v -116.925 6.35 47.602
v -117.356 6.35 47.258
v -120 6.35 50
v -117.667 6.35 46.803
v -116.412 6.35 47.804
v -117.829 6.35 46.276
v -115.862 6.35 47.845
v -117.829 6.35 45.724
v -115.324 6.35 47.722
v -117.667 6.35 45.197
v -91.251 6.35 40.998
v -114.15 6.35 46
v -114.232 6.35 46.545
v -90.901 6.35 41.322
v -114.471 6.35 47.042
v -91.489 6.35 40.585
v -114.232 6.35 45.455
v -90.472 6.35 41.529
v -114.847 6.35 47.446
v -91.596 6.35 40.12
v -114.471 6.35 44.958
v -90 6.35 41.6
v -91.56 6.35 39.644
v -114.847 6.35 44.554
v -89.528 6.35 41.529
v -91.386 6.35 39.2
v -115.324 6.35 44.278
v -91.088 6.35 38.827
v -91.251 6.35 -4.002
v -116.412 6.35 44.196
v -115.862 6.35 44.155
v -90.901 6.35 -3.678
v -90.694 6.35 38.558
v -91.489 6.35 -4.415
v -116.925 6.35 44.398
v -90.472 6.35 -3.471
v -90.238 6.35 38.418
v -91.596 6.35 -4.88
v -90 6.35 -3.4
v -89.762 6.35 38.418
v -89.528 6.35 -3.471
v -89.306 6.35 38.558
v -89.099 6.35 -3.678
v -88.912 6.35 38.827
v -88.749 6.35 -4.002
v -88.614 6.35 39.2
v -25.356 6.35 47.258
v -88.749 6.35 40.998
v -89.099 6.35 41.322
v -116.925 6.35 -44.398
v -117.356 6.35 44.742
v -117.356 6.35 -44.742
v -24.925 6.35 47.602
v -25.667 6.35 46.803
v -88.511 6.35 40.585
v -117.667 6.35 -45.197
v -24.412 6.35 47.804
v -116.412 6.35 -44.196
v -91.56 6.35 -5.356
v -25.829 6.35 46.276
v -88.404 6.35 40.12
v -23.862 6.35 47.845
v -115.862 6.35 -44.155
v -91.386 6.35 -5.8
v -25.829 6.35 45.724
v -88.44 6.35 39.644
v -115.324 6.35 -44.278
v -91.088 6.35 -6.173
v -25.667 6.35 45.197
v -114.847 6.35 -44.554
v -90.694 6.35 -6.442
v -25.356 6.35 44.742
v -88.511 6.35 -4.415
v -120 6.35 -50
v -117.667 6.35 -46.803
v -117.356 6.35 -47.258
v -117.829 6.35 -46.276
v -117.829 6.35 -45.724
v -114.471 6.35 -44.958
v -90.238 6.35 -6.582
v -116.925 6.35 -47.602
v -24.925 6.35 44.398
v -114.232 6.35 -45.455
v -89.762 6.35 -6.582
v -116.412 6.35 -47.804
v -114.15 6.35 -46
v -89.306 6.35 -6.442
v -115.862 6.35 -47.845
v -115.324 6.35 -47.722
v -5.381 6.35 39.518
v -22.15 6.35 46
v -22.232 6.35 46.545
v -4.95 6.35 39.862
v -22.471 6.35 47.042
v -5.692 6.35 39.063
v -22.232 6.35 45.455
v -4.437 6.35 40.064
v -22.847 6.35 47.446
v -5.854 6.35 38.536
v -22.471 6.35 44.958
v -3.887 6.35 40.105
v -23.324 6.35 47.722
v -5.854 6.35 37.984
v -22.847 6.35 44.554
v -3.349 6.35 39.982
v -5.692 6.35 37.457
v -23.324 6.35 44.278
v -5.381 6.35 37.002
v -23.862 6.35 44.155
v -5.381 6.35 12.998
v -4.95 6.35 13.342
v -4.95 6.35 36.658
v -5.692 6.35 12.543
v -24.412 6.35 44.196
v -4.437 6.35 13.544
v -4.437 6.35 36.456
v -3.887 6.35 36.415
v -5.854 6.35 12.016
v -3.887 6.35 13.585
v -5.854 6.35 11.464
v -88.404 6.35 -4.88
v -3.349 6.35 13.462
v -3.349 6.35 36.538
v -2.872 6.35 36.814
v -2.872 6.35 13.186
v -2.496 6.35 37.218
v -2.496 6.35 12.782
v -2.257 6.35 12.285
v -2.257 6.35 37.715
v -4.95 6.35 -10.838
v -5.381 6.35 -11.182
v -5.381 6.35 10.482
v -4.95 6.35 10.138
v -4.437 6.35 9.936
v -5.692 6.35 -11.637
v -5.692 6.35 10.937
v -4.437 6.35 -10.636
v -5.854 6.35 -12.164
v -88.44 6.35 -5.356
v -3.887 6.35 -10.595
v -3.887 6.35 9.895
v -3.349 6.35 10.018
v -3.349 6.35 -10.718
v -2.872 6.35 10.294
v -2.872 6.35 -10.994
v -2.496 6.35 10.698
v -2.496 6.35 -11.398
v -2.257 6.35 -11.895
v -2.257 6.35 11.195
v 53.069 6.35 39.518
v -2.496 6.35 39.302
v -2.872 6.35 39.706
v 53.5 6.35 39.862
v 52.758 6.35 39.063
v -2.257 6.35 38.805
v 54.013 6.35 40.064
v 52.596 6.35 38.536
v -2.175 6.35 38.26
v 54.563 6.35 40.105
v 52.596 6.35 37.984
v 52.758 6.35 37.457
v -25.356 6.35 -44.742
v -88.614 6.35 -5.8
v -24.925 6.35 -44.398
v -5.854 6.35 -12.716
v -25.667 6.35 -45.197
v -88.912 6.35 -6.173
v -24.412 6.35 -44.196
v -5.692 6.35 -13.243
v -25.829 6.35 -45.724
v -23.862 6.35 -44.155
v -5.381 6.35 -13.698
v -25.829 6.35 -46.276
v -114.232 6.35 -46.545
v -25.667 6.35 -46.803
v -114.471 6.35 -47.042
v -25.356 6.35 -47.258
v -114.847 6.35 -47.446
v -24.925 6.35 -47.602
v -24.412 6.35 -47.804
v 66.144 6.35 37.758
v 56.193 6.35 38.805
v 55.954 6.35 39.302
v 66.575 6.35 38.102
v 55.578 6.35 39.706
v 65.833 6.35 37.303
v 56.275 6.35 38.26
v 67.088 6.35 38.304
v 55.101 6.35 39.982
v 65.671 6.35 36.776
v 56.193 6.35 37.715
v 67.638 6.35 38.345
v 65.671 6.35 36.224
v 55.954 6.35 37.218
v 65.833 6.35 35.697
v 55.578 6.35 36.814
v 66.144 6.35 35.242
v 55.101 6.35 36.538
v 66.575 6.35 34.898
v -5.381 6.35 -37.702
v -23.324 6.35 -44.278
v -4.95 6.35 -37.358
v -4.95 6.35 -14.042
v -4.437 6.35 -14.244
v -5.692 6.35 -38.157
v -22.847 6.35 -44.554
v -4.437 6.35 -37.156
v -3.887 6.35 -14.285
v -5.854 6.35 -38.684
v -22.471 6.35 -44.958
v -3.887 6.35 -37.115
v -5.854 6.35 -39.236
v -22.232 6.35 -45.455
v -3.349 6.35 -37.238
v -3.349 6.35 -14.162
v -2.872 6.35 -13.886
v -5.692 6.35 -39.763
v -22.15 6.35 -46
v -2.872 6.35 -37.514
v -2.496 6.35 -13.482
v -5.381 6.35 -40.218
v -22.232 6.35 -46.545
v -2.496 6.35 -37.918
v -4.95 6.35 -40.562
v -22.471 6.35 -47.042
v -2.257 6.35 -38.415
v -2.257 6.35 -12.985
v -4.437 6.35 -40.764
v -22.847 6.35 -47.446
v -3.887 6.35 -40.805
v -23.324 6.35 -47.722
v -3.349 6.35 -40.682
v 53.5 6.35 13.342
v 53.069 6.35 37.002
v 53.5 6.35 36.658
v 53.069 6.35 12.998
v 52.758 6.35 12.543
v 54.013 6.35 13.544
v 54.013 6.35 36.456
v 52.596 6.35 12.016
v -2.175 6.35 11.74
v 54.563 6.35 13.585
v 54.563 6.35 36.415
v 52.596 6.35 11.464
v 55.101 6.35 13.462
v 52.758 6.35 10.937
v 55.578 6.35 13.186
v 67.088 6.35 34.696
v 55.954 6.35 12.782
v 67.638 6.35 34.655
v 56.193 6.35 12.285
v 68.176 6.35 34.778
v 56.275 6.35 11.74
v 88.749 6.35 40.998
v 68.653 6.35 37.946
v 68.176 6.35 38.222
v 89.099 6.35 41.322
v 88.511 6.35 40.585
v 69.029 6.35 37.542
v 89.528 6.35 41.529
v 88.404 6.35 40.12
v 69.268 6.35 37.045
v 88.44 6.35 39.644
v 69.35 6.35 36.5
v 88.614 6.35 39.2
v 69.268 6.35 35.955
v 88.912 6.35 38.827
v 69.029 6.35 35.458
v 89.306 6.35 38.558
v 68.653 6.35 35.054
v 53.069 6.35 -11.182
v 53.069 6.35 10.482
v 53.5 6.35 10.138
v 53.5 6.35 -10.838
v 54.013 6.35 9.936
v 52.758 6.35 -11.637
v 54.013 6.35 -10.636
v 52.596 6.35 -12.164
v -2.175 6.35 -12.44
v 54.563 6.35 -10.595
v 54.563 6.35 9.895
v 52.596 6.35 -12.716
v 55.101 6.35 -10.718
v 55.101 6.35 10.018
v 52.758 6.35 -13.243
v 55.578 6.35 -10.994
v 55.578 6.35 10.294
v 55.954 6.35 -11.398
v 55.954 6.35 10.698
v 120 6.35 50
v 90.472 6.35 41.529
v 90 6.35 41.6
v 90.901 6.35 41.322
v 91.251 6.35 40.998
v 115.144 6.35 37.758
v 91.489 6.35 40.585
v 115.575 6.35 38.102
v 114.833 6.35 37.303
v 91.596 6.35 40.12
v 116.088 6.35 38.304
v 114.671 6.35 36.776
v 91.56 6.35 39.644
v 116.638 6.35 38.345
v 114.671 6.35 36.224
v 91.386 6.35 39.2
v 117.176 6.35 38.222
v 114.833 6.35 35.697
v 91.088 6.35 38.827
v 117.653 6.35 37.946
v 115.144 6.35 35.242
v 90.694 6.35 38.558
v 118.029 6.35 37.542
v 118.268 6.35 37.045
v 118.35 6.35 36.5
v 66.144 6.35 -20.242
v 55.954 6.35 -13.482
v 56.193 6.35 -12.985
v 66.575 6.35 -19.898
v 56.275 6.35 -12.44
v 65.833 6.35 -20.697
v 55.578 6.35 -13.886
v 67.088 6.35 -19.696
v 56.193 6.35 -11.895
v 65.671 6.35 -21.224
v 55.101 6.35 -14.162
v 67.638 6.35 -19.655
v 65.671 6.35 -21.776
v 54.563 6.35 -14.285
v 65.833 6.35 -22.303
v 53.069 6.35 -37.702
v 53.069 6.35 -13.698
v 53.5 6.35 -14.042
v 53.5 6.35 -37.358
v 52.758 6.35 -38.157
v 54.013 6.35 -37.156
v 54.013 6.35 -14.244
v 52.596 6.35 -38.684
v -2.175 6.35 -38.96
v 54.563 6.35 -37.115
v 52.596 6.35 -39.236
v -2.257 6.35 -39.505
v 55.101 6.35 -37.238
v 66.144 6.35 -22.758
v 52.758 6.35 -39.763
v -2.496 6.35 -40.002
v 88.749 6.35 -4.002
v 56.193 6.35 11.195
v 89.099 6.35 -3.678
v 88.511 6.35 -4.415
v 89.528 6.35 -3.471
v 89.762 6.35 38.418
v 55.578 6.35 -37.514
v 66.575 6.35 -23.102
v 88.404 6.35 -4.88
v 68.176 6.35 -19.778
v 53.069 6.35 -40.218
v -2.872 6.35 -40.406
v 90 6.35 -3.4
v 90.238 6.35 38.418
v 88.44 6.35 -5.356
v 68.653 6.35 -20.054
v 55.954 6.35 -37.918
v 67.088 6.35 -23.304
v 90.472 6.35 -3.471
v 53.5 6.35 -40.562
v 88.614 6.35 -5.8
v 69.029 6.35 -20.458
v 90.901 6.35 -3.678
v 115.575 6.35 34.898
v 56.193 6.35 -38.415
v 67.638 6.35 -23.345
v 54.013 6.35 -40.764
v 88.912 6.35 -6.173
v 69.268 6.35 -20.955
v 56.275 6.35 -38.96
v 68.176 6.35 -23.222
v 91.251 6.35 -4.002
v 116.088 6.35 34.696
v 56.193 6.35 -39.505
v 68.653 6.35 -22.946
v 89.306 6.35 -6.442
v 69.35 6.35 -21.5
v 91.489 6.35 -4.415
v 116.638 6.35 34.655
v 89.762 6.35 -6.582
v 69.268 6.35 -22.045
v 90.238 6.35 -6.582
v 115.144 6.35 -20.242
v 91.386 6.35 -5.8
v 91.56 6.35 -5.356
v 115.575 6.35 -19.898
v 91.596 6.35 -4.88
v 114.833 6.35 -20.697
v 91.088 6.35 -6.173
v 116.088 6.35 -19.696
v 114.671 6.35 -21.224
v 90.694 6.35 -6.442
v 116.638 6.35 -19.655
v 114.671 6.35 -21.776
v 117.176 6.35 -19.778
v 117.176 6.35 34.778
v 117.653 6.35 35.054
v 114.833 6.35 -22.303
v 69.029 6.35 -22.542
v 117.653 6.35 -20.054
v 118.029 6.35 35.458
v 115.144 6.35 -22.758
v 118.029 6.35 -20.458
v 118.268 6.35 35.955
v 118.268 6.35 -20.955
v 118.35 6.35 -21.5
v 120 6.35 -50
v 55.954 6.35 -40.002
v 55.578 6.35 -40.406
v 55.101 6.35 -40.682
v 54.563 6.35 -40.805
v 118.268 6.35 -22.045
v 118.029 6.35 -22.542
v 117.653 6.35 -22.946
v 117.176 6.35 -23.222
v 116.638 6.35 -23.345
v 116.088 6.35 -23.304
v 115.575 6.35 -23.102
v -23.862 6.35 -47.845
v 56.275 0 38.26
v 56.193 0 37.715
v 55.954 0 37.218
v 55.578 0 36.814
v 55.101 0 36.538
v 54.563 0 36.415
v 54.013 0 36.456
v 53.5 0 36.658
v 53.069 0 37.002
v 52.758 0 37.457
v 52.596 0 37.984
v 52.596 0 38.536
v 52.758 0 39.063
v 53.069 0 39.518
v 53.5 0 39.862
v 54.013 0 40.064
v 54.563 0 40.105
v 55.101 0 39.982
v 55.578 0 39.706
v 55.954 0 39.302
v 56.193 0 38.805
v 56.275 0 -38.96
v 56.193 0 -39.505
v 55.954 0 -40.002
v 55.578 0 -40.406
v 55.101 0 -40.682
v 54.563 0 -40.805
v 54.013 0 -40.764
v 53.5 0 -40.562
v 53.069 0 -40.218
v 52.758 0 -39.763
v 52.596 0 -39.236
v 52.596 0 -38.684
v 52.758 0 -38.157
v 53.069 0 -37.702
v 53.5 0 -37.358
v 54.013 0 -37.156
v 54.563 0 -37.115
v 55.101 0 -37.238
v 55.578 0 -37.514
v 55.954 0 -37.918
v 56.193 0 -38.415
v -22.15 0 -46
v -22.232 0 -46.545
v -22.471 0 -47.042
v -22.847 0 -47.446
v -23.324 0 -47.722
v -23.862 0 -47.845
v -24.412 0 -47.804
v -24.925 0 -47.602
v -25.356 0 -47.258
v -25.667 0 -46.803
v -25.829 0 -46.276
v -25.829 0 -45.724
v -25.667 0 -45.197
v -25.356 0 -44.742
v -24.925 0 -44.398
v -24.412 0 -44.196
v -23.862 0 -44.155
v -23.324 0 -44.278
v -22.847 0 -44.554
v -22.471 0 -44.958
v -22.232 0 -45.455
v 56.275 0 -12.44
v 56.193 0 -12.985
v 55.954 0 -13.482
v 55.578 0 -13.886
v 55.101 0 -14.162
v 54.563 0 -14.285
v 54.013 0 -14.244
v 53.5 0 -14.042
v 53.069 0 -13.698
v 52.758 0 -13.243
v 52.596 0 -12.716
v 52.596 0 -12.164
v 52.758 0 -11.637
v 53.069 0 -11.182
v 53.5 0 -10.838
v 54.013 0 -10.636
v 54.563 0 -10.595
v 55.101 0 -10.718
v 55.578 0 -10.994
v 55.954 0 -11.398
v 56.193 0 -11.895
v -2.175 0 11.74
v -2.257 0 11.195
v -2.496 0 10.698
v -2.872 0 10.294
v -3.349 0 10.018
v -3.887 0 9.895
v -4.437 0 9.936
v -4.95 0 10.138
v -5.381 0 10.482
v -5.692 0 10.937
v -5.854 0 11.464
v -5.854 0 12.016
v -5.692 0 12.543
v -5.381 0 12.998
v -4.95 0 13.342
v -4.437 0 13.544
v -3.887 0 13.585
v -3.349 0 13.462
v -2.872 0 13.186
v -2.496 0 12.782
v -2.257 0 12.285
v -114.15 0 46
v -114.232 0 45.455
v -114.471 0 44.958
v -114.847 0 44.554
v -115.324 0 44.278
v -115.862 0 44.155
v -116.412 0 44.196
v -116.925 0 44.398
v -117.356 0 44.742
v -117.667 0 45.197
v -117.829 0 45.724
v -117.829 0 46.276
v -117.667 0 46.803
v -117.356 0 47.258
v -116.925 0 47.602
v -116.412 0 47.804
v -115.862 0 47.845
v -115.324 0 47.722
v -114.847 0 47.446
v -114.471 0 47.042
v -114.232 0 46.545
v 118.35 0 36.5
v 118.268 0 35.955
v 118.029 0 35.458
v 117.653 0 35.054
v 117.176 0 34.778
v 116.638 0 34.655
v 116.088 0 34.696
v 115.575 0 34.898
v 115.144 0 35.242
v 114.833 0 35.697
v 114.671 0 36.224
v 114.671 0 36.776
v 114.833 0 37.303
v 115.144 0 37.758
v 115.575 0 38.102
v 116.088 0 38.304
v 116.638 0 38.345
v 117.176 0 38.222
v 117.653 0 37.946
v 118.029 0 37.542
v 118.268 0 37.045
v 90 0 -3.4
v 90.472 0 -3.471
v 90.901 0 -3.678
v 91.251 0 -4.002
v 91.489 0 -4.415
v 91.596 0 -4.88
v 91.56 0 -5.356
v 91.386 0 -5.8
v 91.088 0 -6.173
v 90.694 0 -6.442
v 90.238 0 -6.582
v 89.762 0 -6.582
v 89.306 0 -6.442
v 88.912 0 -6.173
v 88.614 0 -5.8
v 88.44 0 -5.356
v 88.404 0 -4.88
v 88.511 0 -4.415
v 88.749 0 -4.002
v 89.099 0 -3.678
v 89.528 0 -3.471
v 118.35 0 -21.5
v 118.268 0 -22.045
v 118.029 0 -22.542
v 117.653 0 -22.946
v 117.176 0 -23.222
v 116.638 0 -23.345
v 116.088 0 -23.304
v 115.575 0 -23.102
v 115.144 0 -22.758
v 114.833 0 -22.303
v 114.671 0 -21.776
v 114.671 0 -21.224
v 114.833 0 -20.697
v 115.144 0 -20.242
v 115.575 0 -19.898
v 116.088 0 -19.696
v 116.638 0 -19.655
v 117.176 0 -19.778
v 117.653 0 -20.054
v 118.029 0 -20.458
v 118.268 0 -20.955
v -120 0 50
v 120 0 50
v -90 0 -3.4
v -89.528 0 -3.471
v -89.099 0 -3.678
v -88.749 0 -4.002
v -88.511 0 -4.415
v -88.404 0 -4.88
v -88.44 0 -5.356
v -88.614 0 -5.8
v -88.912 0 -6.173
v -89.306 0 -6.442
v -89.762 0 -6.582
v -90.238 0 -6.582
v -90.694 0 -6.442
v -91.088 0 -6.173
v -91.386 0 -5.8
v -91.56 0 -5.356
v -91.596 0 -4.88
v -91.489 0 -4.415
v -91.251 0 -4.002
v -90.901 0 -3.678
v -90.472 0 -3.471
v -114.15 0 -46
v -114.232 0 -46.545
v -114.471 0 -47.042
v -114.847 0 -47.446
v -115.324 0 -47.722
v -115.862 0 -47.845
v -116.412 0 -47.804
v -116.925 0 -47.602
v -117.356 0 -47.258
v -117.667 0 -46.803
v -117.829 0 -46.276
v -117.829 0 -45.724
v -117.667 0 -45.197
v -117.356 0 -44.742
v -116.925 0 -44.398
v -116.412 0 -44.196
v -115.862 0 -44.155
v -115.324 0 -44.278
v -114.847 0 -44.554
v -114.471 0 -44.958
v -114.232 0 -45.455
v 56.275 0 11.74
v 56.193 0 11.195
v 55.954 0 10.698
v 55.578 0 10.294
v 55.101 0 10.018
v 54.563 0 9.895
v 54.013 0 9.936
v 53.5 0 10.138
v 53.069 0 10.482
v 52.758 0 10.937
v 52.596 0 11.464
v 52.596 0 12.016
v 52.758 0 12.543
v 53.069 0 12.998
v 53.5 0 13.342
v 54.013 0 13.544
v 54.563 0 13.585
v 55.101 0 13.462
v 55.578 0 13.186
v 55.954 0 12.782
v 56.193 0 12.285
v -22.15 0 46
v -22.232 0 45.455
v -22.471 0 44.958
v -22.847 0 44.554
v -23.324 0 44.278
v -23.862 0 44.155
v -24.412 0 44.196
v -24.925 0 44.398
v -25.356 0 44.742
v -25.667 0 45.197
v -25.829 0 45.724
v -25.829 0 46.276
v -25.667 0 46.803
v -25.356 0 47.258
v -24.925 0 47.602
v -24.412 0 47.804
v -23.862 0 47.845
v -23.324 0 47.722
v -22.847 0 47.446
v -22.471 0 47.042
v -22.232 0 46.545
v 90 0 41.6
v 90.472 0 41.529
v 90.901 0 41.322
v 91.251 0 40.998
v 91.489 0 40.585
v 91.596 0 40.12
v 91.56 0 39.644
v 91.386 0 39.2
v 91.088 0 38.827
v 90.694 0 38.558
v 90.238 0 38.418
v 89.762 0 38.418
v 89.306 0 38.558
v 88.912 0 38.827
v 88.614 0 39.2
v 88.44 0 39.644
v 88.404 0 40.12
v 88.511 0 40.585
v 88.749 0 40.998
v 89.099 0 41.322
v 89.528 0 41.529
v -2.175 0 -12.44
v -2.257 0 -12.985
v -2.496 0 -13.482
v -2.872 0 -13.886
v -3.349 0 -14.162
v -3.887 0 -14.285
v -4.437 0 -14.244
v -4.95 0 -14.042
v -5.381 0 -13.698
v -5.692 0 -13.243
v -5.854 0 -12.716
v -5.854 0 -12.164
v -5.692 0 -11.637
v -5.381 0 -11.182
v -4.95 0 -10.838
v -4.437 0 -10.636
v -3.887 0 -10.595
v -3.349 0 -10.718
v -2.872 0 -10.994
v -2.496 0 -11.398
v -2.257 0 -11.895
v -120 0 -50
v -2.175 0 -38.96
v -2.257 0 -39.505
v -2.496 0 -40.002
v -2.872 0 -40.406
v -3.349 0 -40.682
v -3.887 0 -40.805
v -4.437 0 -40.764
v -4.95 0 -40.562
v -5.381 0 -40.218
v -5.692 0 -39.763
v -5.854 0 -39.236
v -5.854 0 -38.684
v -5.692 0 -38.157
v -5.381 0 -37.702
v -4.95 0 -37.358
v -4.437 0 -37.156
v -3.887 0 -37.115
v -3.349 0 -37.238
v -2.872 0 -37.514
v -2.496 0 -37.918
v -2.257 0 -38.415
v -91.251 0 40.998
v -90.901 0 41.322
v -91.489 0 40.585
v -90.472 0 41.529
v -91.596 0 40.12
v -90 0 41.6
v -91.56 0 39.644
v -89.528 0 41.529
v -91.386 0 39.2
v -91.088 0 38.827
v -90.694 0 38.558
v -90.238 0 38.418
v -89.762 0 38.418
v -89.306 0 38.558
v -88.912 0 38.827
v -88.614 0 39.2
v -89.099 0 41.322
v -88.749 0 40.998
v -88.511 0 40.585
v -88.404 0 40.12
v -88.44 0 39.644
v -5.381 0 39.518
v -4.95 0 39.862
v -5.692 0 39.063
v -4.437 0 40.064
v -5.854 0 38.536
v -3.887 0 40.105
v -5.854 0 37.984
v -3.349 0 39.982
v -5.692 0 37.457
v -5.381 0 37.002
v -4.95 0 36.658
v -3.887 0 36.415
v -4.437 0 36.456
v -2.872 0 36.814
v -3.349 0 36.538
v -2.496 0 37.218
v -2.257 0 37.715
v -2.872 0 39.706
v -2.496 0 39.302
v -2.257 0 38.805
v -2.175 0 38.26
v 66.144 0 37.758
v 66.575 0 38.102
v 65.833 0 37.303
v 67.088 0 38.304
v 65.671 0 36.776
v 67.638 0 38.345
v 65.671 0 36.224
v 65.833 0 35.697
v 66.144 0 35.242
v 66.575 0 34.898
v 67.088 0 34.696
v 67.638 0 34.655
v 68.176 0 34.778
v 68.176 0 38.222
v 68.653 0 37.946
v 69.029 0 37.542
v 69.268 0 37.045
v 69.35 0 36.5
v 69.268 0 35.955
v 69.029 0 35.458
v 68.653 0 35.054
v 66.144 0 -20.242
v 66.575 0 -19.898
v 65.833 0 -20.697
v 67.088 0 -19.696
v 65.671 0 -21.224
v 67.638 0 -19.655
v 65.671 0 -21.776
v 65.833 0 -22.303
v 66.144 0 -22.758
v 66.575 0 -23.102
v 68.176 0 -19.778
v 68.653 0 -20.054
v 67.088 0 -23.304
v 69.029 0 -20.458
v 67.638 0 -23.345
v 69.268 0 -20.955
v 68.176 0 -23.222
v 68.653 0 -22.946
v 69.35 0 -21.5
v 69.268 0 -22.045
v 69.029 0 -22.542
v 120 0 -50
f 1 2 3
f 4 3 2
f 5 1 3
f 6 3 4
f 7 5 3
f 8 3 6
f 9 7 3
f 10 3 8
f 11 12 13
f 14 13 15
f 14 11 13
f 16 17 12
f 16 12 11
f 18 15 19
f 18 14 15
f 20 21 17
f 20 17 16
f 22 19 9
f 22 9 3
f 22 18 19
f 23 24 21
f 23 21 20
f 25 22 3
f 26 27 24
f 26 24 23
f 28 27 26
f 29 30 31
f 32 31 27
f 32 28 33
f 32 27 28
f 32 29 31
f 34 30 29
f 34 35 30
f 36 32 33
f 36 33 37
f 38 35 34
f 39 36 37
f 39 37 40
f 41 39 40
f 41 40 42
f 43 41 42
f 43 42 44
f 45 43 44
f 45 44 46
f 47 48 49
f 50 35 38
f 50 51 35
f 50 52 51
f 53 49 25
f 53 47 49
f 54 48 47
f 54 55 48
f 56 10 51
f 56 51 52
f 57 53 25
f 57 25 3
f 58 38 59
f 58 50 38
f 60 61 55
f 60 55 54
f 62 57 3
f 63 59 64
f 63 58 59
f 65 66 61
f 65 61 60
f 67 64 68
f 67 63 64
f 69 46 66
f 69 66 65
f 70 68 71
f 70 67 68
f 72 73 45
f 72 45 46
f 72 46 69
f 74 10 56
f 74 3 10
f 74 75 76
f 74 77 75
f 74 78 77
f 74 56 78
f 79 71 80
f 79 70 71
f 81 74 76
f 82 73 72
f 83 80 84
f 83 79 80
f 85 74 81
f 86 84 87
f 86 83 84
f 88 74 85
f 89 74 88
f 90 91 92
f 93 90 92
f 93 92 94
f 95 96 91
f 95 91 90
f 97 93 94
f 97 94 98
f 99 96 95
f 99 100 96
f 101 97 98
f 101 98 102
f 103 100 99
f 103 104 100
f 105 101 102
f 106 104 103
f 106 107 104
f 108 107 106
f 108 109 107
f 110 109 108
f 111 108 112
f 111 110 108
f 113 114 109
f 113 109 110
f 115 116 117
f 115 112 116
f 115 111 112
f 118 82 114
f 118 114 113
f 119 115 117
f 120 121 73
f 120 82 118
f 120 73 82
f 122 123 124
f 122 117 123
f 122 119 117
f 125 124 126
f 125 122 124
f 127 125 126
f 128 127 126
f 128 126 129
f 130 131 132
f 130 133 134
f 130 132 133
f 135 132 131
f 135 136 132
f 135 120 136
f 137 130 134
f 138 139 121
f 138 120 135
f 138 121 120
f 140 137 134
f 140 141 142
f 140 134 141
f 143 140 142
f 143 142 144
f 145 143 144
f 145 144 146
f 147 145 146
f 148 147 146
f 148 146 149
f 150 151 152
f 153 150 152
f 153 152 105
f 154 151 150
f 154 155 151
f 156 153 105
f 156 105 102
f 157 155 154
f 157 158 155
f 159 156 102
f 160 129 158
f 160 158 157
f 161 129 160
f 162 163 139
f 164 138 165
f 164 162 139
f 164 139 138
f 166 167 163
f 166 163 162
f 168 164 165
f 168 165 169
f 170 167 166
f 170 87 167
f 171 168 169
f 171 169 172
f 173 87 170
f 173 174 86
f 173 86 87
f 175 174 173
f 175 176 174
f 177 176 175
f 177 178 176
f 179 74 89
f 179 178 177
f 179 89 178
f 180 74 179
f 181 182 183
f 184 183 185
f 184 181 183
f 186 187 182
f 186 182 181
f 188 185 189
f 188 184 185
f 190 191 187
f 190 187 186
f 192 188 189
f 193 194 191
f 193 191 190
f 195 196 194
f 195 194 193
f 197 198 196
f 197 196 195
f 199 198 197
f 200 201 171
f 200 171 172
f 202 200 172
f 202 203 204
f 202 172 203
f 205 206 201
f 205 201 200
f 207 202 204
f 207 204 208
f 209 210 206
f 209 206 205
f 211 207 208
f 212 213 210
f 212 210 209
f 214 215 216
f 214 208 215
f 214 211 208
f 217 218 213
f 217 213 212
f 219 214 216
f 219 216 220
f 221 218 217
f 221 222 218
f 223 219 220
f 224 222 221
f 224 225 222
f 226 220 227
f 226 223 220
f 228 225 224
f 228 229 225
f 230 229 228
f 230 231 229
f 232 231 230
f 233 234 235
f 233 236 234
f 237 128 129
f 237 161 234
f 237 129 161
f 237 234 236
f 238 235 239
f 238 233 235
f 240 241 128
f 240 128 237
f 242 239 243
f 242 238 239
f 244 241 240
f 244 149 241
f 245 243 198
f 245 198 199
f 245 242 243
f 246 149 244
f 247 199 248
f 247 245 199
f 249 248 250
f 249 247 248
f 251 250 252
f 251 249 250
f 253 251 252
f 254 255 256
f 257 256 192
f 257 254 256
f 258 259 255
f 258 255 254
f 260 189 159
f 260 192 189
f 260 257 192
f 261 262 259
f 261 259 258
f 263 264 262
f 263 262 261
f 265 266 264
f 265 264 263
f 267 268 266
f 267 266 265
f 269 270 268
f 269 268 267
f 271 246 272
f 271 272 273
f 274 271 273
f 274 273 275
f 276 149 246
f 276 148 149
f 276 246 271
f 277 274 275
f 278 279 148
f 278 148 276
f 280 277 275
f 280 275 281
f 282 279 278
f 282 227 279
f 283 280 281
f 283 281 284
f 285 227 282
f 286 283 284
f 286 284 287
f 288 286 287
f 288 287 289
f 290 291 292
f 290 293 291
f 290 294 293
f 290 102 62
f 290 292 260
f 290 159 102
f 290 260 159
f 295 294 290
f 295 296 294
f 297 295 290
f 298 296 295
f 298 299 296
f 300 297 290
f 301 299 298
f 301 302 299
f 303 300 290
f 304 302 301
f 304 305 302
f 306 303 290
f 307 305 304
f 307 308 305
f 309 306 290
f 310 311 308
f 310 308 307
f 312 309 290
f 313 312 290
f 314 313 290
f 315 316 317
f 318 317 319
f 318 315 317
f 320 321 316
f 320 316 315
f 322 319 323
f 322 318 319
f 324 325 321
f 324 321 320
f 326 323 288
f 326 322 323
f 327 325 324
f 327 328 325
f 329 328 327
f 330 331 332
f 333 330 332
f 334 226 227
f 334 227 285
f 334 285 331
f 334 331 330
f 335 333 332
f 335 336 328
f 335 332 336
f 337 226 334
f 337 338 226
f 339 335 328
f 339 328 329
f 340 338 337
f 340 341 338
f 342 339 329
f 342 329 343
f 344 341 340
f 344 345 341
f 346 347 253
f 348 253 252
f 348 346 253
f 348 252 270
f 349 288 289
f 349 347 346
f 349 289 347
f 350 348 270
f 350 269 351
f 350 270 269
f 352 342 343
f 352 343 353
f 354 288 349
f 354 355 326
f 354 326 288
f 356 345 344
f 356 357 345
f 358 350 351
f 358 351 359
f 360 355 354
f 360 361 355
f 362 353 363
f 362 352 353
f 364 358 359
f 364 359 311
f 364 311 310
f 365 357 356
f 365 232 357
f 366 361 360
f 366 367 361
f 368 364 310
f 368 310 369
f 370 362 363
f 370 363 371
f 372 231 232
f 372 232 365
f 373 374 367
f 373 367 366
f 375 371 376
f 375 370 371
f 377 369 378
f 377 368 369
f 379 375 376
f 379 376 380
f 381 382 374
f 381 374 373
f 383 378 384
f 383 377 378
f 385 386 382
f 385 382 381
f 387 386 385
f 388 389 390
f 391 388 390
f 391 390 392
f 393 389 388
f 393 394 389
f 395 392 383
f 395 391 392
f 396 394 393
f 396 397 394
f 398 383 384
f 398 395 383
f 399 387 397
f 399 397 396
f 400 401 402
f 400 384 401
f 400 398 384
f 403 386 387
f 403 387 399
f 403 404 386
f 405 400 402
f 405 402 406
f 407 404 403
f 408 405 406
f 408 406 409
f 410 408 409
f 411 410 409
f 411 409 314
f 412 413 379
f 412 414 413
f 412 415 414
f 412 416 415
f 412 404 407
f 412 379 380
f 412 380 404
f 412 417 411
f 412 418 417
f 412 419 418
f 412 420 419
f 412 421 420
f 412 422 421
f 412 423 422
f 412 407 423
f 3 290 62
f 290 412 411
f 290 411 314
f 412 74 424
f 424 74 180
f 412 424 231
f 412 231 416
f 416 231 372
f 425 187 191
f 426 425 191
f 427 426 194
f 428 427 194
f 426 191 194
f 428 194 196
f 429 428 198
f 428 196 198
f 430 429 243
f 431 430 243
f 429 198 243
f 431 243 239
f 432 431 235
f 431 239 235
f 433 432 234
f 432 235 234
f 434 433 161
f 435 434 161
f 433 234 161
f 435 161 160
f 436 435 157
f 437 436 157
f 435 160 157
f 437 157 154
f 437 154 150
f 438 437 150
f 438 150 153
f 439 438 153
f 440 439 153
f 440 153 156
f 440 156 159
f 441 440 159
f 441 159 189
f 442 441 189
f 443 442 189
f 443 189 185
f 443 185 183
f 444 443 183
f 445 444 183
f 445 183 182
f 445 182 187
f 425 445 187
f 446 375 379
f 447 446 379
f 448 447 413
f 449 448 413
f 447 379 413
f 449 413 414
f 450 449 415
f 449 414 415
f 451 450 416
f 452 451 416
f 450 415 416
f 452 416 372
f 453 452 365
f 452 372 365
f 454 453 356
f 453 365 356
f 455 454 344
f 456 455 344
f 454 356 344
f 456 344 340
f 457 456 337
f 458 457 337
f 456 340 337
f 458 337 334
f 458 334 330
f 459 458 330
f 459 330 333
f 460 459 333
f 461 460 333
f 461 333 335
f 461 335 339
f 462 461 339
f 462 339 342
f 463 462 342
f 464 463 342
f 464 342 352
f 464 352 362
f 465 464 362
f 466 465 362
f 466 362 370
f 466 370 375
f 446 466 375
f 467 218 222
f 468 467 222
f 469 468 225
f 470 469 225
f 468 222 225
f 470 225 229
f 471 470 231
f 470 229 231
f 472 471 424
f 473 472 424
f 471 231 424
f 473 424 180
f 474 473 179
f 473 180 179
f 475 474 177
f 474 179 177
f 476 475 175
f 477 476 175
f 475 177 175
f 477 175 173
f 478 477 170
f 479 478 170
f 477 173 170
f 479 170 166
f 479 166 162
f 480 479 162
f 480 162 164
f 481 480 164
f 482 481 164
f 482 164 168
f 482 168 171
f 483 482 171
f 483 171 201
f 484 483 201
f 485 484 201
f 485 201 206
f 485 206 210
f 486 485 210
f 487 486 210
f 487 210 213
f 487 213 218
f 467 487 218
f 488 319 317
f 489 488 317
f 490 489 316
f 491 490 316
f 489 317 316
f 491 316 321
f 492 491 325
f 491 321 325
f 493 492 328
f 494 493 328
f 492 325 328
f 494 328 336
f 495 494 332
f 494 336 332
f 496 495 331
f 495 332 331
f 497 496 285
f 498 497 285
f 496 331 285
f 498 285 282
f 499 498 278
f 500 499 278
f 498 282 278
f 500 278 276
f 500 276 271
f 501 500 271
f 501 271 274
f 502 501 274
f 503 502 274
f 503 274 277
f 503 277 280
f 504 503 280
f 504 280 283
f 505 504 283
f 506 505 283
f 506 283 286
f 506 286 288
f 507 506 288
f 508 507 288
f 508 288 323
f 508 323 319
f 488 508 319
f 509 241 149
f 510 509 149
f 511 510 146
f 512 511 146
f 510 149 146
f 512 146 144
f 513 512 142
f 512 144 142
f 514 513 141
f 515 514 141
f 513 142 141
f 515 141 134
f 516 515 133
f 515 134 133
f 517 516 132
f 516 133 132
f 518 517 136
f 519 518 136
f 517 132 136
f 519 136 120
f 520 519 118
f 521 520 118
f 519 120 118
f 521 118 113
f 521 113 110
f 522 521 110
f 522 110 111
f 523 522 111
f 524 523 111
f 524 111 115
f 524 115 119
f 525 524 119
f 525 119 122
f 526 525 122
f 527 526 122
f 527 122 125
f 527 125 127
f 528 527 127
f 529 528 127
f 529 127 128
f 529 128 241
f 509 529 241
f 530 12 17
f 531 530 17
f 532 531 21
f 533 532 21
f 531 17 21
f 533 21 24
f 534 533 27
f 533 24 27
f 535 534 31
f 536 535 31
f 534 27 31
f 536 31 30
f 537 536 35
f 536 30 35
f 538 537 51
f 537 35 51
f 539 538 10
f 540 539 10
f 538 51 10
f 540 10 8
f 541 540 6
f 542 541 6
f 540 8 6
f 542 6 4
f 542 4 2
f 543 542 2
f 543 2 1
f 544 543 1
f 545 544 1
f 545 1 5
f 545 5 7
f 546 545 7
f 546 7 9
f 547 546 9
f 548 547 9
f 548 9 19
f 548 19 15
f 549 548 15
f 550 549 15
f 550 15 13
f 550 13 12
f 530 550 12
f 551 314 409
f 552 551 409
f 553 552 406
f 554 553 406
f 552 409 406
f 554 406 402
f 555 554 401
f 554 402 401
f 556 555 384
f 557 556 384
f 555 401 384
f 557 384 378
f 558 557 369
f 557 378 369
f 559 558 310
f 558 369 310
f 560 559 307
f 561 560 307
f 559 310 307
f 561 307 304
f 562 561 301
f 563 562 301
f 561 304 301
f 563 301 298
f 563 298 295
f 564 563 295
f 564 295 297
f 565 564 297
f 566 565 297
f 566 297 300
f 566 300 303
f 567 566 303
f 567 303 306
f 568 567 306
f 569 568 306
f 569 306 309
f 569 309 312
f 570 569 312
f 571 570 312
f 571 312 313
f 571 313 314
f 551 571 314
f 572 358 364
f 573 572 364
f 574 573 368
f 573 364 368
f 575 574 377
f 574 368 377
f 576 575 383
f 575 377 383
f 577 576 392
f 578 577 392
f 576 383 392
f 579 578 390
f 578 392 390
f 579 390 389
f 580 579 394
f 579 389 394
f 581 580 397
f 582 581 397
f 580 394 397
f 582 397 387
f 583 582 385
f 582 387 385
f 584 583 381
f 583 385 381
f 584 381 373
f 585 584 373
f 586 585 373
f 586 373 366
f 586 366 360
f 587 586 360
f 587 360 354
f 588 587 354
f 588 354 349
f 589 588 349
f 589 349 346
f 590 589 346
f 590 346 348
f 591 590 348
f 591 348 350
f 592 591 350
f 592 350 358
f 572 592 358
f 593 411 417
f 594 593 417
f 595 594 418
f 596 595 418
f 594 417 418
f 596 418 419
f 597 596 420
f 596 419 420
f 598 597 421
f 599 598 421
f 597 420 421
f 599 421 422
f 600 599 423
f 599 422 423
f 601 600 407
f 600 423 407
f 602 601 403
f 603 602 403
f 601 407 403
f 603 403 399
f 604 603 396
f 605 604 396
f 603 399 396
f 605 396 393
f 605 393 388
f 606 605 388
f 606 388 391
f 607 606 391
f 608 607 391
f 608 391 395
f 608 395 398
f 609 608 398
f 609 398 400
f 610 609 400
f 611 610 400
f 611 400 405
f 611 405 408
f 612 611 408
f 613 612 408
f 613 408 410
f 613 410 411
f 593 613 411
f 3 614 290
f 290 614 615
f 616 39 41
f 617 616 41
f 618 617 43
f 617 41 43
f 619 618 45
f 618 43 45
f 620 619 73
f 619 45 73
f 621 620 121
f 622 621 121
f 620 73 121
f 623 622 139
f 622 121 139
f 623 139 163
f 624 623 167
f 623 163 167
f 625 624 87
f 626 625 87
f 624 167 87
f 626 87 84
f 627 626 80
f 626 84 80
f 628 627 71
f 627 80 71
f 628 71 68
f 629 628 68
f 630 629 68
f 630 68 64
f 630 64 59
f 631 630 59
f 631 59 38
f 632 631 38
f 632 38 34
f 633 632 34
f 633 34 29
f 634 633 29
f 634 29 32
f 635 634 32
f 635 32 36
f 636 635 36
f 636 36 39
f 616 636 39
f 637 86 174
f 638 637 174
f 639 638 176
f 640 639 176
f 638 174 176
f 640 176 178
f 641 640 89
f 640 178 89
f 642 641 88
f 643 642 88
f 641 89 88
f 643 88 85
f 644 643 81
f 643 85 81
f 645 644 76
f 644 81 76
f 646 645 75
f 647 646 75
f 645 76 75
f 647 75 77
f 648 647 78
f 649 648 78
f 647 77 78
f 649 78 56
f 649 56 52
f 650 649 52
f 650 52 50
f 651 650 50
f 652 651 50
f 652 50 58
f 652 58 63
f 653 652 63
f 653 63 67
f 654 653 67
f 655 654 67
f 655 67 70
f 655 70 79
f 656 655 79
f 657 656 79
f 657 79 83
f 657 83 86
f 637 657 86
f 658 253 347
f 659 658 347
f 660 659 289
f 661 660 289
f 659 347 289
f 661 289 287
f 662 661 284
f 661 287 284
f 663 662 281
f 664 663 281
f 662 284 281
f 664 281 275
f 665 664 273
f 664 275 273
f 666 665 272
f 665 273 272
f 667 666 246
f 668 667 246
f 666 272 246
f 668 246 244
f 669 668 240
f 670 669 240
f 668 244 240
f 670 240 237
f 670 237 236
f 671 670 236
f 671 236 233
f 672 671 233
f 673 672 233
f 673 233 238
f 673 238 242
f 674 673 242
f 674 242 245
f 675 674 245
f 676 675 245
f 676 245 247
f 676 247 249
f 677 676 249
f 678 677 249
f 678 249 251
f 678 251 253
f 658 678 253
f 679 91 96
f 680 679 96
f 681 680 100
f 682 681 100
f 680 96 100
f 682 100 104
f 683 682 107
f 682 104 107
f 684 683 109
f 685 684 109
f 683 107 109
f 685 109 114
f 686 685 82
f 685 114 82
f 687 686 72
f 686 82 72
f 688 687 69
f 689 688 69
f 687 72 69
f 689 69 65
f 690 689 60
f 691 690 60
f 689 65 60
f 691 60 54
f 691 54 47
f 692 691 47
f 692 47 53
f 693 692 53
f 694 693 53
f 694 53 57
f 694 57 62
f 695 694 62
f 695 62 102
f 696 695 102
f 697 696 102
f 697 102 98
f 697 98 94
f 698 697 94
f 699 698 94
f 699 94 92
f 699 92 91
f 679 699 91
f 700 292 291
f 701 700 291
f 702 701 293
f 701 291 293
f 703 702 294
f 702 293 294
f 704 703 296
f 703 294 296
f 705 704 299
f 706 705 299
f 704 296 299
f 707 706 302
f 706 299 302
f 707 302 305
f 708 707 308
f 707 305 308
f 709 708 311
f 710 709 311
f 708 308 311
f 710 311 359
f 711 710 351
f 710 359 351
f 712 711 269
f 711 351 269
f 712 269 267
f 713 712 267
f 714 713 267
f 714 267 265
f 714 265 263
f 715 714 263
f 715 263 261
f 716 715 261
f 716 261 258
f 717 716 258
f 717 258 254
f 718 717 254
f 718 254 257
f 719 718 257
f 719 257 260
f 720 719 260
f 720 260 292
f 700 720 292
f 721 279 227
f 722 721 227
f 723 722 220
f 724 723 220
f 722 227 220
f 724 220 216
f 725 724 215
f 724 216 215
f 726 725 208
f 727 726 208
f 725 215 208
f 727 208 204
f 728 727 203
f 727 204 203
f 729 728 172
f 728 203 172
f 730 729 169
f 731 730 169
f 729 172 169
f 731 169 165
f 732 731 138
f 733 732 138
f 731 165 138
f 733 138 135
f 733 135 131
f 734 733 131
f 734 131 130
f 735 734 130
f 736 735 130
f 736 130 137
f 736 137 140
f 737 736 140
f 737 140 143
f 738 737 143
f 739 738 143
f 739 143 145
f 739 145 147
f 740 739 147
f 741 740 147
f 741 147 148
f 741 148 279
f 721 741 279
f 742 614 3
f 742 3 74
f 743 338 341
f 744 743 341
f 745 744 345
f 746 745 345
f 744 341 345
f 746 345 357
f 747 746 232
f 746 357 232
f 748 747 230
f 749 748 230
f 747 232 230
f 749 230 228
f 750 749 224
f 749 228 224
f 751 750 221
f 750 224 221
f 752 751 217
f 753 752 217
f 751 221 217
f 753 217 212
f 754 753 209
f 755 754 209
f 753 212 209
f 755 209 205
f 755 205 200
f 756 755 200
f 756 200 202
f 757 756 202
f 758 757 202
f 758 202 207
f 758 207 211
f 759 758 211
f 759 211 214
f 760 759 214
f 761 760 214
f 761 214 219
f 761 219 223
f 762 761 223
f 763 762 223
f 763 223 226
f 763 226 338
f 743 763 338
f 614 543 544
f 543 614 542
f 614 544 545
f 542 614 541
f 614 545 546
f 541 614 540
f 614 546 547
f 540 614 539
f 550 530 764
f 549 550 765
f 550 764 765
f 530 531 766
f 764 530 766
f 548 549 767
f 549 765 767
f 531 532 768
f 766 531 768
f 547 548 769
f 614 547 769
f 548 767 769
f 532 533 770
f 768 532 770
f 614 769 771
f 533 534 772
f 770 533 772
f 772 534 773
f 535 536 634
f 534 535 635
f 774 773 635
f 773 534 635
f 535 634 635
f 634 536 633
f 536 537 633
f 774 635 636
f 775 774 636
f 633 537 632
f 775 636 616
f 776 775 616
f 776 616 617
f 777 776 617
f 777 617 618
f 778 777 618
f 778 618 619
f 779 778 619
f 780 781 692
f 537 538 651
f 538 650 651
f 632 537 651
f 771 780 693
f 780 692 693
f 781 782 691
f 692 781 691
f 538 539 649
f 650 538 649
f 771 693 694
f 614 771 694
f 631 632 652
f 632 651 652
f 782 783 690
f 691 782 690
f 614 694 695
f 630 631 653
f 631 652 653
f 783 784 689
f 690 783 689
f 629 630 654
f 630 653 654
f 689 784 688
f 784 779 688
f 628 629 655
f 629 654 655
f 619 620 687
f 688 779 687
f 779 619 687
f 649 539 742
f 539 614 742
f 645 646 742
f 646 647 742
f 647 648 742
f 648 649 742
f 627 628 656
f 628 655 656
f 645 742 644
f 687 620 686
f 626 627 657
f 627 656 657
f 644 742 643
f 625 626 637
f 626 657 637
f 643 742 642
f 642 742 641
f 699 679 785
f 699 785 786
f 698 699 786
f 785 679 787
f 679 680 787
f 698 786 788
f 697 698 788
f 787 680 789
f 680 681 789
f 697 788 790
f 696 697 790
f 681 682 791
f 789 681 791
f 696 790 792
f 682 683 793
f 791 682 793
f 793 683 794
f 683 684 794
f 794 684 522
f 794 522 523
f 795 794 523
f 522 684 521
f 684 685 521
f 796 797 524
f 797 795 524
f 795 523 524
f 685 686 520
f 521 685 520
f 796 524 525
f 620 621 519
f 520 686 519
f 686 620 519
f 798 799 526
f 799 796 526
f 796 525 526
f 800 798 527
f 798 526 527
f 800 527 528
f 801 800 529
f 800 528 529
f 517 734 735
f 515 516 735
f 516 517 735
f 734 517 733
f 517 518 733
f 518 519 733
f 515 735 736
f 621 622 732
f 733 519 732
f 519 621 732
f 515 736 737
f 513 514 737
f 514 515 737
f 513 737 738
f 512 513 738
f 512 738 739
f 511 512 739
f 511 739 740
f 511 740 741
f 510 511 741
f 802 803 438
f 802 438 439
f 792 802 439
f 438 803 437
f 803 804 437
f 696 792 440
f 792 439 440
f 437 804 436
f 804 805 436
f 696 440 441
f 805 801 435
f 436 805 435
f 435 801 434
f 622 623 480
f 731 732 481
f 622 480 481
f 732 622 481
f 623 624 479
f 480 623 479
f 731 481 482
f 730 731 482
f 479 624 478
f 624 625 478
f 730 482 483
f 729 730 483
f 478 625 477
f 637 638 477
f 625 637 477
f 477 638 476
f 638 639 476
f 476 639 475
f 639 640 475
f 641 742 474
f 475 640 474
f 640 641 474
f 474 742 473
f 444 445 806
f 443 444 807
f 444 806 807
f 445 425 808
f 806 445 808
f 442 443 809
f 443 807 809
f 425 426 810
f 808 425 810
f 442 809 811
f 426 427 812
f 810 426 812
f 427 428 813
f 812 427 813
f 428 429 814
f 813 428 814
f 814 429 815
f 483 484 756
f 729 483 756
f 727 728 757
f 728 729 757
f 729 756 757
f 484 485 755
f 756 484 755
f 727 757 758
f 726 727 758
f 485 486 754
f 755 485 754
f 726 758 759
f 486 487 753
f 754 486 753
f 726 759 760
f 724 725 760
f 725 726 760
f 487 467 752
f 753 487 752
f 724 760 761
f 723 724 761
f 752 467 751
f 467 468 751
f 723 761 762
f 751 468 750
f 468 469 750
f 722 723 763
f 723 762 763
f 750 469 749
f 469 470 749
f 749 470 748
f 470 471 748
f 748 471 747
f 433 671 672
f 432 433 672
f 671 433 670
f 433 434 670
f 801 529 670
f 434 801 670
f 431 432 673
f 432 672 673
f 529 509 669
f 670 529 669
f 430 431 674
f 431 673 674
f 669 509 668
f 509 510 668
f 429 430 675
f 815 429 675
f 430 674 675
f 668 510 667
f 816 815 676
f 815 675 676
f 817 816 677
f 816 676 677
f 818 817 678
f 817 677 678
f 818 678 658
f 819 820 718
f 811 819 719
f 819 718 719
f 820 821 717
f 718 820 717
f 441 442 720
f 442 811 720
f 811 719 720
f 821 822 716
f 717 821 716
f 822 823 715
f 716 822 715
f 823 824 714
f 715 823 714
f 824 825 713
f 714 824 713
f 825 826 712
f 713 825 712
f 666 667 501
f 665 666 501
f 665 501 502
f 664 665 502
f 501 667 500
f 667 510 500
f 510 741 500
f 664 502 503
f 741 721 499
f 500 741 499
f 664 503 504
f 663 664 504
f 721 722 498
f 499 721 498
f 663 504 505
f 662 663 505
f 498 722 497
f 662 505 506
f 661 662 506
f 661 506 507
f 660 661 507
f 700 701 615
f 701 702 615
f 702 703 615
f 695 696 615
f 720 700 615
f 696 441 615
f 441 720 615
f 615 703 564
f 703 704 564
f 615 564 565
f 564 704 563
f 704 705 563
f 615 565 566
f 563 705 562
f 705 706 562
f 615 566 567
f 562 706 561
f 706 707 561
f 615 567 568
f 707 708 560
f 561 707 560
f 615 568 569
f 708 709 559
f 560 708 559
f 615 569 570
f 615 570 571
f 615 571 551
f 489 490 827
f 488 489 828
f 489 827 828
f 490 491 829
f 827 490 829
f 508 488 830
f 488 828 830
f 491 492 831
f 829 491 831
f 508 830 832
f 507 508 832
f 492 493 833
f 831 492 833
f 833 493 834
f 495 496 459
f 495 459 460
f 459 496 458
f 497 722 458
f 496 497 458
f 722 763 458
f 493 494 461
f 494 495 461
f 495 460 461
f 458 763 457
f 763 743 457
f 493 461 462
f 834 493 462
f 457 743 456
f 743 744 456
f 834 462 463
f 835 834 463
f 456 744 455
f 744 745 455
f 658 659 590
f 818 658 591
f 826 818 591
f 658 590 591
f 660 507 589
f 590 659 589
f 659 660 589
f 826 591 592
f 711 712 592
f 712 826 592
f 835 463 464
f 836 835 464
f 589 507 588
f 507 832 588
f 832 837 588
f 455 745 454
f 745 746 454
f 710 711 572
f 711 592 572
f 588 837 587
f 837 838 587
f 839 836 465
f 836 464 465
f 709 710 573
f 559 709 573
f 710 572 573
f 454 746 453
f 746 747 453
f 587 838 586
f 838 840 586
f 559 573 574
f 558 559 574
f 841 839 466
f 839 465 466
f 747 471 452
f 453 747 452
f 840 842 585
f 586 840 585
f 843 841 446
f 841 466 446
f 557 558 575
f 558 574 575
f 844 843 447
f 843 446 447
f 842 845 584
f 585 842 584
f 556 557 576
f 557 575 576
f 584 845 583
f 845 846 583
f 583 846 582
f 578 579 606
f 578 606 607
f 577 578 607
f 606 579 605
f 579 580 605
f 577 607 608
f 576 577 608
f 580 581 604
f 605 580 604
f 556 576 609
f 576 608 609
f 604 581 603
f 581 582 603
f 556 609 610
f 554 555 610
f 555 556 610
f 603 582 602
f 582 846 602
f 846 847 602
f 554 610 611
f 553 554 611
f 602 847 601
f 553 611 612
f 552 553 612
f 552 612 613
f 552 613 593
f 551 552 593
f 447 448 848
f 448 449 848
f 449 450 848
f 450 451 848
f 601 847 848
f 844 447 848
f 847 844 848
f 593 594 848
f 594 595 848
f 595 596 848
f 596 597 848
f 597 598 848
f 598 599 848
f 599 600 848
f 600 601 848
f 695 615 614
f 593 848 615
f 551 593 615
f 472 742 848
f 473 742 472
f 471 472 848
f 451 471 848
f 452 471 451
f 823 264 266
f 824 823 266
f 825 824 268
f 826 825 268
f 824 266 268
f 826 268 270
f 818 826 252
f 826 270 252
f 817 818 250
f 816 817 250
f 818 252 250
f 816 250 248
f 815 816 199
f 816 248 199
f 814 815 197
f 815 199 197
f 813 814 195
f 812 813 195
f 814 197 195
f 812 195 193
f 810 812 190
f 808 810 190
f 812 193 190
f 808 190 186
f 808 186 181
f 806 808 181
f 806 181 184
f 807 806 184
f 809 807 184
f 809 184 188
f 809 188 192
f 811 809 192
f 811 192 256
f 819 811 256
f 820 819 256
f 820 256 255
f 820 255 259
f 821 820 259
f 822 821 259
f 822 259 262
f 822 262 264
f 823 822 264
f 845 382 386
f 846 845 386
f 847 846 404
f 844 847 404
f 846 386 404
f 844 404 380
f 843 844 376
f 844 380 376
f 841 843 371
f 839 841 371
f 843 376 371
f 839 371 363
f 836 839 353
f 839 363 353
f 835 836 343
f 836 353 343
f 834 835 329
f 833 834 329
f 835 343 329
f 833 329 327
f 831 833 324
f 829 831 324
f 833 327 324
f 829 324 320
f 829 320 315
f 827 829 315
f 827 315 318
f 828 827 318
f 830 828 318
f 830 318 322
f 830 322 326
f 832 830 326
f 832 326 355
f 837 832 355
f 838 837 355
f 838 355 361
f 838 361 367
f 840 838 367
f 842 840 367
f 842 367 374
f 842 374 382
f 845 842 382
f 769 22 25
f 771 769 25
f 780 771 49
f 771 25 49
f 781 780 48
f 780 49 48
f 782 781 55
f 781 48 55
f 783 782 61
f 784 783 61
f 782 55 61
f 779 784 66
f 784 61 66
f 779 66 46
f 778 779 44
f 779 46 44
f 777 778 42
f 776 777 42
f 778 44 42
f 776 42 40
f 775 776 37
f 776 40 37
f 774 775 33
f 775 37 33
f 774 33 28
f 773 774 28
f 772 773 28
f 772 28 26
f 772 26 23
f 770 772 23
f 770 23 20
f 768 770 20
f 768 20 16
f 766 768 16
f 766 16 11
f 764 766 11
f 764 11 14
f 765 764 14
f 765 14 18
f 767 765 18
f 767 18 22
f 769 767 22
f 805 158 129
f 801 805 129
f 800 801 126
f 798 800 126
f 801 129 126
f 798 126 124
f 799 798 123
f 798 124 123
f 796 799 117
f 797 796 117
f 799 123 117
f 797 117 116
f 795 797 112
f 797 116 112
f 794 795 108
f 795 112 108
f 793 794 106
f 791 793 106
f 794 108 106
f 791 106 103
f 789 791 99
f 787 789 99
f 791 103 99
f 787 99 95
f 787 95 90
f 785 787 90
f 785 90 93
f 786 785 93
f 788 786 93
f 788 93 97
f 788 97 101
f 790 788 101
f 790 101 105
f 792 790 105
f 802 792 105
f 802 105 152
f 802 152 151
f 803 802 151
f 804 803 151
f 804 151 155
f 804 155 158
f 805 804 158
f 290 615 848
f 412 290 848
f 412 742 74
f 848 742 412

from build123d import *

# Parameters (mm, degrees)
SKETCH1_W                       = 240
SKETCH1_H                       = 100
BOSS_EXTRUDE1_DEPTH             = 6.35
F_3_0MM_CLEARANCE_DOWEL_HOLE2_D = 3.7
SKETCH6_R                       = 1.6
CUT_EXTRUDE1_DEPTH              = 131.154994142


with BuildPart() as part:
    # Sketch1 → Boss-Extrude1 (new body)
    with BuildSketch(Plane(origin=(0, 0, 0), x_dir=(1, 0, 0), z_dir=(0, 1, 0))):
        Rectangle(SKETCH1_W, SKETCH1_H)
    extrude(amount=BOSS_EXTRUDE1_DEPTH)

    # Ø3.0mm Clearance Dowel Hole2 (through all)
    with Locations(Plane(origin=(-50.304100292, 0, 69.560858654), x_dir=(-1, 0, 0), z_dir=(0, -1, 0))):
        with Locations((-46.279100292, 82.000858654), (-26.304100292, 115.560858654), (-46.279100292, 108.520858654), (-46.279100292, 57.820858654), (-46.279100292, 31.300858654), (-26.304100292, 23.560858654), (65.695899708, 23.560858654), (-104.729100292, 31.300858654), (-104.729100292, 57.820858654), (-104.729100292, 82.000858654), (-104.729100292, 108.520858654), (-166.804100292, 33.060858654), (-166.804100292, 91.060858654), (-117.804100292, 91.060858654), (-117.804100292, 33.060858654), (65.695899708, 115.560858654)):
            Hole(F_3_0MM_CLEARANCE_DOWEL_HOLE2_D / 2)

    # Sketch6 → Cut-Extrude1 (cut, through all)
    with BuildSketch(Plane(origin=(0, 6.35, 0), x_dir=(1, 0, 0), z_dir=(0, 1, 0))):
        with Locations(Location((-90, 5, 0), (0, 0, 270))):
            Circle(SKETCH6_R)
        with Locations(Location((-90, -40, 0), (0, 0, 270))):
            Circle(SKETCH6_R)
        with Locations(Location((90, 5, 0), (0, 0, 270))):
            Circle(SKETCH6_R)
        with Locations(Location((90, -40, 0), (0, 0, 270))):
            Circle(SKETCH6_R)
    extrude(amount=-CUT_EXTRUDE1_DEPTH, mode=Mode.SUBTRACT)


solid = part.part
